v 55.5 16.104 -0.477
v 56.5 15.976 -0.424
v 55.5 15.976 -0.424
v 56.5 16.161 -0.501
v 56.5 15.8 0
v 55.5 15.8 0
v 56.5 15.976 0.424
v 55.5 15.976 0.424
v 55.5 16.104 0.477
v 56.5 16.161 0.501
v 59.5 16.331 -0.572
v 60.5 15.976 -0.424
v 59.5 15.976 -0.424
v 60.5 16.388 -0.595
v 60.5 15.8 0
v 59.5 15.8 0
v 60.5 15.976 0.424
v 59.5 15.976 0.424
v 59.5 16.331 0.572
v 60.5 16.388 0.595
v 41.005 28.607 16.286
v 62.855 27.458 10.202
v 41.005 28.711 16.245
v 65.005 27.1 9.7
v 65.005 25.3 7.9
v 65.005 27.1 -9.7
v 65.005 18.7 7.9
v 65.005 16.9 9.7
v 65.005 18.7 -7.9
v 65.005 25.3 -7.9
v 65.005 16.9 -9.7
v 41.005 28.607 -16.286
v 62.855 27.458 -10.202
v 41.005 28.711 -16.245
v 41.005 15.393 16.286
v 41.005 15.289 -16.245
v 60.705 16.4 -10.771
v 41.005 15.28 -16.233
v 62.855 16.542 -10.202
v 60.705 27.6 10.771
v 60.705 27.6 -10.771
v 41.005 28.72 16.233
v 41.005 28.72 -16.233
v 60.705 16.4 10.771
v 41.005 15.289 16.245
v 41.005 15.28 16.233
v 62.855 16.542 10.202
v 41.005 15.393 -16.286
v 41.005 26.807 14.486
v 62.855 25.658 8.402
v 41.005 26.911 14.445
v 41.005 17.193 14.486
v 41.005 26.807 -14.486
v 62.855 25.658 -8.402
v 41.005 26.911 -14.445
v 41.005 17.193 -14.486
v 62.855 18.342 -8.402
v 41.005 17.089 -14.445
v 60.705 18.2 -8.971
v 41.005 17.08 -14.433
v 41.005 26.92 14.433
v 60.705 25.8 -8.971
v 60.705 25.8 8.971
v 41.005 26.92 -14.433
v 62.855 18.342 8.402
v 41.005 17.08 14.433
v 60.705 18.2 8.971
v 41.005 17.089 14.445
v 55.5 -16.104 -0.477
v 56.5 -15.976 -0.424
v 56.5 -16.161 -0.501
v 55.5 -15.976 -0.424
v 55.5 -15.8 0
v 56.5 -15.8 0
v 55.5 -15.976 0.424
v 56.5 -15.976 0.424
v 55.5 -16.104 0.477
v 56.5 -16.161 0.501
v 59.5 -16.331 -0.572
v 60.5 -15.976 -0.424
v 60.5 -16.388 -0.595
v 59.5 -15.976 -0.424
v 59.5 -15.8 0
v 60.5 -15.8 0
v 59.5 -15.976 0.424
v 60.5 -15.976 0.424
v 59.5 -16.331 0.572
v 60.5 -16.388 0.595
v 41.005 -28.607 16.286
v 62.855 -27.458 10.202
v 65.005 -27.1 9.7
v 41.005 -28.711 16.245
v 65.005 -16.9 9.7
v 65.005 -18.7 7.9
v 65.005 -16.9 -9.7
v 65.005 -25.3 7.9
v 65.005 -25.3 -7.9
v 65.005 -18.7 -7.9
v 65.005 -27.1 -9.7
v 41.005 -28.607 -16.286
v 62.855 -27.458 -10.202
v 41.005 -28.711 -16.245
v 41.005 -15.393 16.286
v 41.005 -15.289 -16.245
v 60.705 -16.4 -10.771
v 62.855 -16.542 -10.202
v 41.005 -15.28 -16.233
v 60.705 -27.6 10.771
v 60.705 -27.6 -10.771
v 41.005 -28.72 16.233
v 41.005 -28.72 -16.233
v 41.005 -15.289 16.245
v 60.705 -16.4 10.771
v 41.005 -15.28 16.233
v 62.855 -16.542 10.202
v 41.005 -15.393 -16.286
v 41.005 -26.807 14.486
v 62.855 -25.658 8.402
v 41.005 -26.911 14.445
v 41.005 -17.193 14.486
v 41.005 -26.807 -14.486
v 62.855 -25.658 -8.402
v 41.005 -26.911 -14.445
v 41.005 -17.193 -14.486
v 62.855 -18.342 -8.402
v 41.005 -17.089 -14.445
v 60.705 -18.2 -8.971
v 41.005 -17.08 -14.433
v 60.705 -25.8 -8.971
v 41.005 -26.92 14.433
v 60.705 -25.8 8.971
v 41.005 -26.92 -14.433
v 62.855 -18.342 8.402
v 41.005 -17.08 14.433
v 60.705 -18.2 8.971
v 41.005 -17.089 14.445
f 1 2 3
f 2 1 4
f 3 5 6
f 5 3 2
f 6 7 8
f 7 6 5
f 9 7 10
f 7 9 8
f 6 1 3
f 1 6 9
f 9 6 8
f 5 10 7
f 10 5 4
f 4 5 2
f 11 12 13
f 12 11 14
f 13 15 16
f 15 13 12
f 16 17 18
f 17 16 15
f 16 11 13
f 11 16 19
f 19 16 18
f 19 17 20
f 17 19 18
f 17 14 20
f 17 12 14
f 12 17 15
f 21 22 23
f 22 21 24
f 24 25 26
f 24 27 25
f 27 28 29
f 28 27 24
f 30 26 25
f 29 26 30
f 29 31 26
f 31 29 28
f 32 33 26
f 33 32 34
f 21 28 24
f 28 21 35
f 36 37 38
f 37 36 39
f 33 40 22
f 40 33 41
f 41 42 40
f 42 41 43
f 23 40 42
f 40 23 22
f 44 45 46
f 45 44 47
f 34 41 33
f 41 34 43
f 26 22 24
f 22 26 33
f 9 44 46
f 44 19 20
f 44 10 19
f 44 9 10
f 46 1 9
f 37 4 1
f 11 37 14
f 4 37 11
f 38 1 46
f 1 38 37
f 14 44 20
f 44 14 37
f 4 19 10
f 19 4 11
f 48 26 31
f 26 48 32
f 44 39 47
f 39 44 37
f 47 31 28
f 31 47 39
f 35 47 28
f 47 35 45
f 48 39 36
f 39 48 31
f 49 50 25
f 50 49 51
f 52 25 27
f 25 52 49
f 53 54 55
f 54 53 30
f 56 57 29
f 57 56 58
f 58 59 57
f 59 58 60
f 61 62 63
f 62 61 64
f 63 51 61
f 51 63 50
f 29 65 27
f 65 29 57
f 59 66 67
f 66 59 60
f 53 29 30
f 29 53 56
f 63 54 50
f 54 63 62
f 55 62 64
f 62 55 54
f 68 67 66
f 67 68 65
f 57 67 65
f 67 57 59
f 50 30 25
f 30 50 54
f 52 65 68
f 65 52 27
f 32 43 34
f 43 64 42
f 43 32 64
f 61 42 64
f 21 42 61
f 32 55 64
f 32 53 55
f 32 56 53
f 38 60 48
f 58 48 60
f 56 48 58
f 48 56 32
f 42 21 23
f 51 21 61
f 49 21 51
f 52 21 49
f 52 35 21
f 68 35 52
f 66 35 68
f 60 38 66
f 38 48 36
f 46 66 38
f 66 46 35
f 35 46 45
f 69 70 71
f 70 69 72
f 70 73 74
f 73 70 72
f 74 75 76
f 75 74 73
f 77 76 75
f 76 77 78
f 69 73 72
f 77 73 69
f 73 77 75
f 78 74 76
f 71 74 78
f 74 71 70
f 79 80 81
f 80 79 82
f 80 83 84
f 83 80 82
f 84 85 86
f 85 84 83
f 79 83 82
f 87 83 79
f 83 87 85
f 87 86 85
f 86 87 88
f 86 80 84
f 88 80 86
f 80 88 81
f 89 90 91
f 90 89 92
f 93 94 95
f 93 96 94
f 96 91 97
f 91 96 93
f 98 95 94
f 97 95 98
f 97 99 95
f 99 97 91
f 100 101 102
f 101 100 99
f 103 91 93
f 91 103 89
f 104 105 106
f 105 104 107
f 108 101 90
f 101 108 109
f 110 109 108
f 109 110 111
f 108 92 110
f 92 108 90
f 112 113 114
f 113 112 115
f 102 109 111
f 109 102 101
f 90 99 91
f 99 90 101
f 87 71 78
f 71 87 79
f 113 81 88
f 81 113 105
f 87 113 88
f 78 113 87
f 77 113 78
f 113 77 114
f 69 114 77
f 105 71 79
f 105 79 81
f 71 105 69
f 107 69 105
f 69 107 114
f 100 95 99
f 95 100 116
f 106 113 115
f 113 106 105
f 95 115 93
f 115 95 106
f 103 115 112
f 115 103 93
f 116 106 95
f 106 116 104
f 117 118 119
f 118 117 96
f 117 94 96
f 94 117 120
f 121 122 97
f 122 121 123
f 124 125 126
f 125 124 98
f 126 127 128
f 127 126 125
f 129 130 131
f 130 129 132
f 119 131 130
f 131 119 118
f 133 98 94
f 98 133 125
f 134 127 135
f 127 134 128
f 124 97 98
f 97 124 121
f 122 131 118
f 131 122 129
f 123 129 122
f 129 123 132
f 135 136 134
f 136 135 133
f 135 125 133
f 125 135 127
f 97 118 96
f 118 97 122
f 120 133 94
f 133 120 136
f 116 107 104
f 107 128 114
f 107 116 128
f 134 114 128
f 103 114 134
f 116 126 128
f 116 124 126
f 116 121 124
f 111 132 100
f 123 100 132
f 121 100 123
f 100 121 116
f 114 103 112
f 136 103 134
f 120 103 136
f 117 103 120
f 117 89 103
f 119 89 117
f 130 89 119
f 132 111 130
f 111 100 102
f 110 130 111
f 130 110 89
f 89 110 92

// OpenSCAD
// ============================================================
//  OMX_F Gripper Finger Sleeve
//  Fits link6 (motorized) AND link7 (gear) — blade zone only
//  Blade X range: 22 mm → 65 mm  (finger-local frame)
//  Source dimensions: OMX_F gripper finger spec sheet
// ============================================================

// ── USER PARAMETERS ─────────────────────────────────────────

// Wall thickness around the blade (mm)
wall = 1.8;

// Extra clearance added to every cross-section (mm, tweak for print fit)
clearance = 0.3;

// Grip surface texture: "smooth", "ridged", "dotted"
grip_texture = "ridged";

// Ridged texture settings (ignored if grip_texture != "ridged")
ridge_pitch = 4.0;   // spacing between ridges (mm)
ridge_depth = 0.6;   // depth of each ridge (mm)

// Show the finger phantom (for visual check — disable before exporting)
show_phantom = false;

// Which finger to generate: "link6", "link7", or "both"
finger = "both";

// ── BLADE CROSS-SECTION DATA (from spec sheet) ───────────────
//   [ X,  half_Y, half_Z ]  — all mm, finger-local frame
blade_pts = [
    [ 22,  5.7, 19.4 ],
    [ 28,  4.2, 17.7 ],
    [ 36,  3.1, 15.5 ],
    [ 46,  2.8, 12.7 ],
    [ 55,  3.5, 10.3 ],
    [ 62,  3.5,  8.3 ],
    [ 65,  3.0,  7.6 ],
];

// ── DERIVED VALUES ────────────────────────────────────────────
sleeve_x_start = blade_pts[0][0];          // 22
sleeve_x_end   = blade_pts[len(blade_pts)-1][0];  // 65
sleeve_length  = sleeve_x_end - sleeve_x_start;   // 43

// ── HELPERS ───────────────────────────────────────────────────

// Linearly interpolate blade cross-section at a given X position
function blade_half_y(x) =
    let(i = search_segment(x))
    let(x0 = blade_pts[i][0],   y0 = blade_pts[i][1],
        x1 = blade_pts[i+1][0], y1 = blade_pts[i+1][1])
    y0 + (y1-y0) * (x-x0)/(x1-x0);

function blade_half_z(x) =
    let(i = search_segment(x))
    let(x0 = blade_pts[i][0],   z0 = blade_pts[i][2],
        x1 = blade_pts[i+1][0], z1 = blade_pts[i+1][2])
    z0 + (z1-z0) * (x-x0)/(x1-x0);

// Return the blade_pts index i such that blade_pts[i][0] <= x < blade_pts[i+1][0]
function search_segment(x, i=0) =
    (i >= len(blade_pts)-2) ? i :
    (x <= blade_pts[i+1][0]) ? i : search_segment(x, i+1);

// ── SLEEVE BODY ───────────────────────────────────────────────
// Built as a hull of scaled rectangles along X, then subtract the
// inner cavity (blade shape + clearance).

N_SLICES = 20;   // number of cross-section slices

module blade_slice(x, extra_y=0, extra_z=0) {
    hy = blade_half_y(x) + extra_y;
    hz = blade_half_z(x) + extra_z;
    translate([x, 0, 0])
        cube([0.01, hy*2, hz*2], center=true);
}

module sleeve_outer() {
    hull()
        for (i = [0:N_SLICES]) {
            x = sleeve_x_start + i * sleeve_length / N_SLICES;
            blade_slice(x, extra_y = wall + clearance,
                           extra_z = wall + clearance);
        }
}

module sleeve_inner_cavity() {
    // finger blade + clearance gap
    hull()
        for (i = [0:N_SLICES]) {
            x = sleeve_x_start + i * sleeve_length / N_SLICES;
            blade_slice(x, extra_y = clearance,
                           extra_z = clearance);
        }
}

// Entry chamfer — open the back end so the blade slides in easily
module entry_chamfer() {
    chamfer = 3.0;
    hull() {
        blade_slice(sleeve_x_start,
            extra_y = clearance + wall,
            extra_z = clearance + wall);
        blade_slice(sleeve_x_start,
            extra_y = clearance + wall + chamfer,
            extra_z = clearance + wall + chamfer);
        translate([sleeve_x_start - chamfer, 0, 0])
            blade_slice(sleeve_x_start,
                extra_y = clearance + wall + chamfer,
                extra_z = clearance + wall + chamfer);
    }
}

// Ridged grip texture on the outer −Y face (inner/gripping side)
module add_ridges() {
    n_ridges = floor(sleeve_length / ridge_pitch);
    for (i = [0:n_ridges-1]) {
        x = sleeve_x_start + (i + 0.5) * ridge_pitch;
        if (x < sleeve_x_end) {
            hy_out = blade_half_y(x) + wall + clearance;
            hz_out = blade_half_z(x) + wall + clearance;
            // Ridge sits on the −Y (inner/gripping) face
            translate([x, -hy_out, 0])
                rotate([0, 90, 0])
                    cylinder(d=ridge_depth*2, h=1.0, center=true, $fn=8);
        }
    }
}

// Full sleeve for one finger
module sleeve(mirror_y=false) {
    scale([1, mirror_y ? -1 : 1, 1])
    difference() {
        union() {
            sleeve_outer();
            if (grip_texture == "ridged") add_ridges();
        }
        sleeve_inner_cavity();
        entry_chamfer();
    }
}

// ── PHANTOM FINGER (visual check only) ───────────────────────
module finger_phantom() {
    color("cyan", 0.25)
    hull()
        for (i = [0:N_SLICES]) {
            x = sleeve_x_start + i * sleeve_length / N_SLICES;
            blade_slice(x);
        }
}

// ── RENDER ───────────────────────────────────────────────────
// link6: inner face = −Y  (no Y mirror needed)
// link7: inner face = +Y  (mirror in Y)

Y_OFFSET = 22;   // visual separation when showing both

if (finger == "link6") {
    sleeve(mirror_y=false);
    if (show_phantom) finger_phantom();

} else if (finger == "link7") {
    sleeve(mirror_y=true);
    if (show_phantom) finger_phantom();

} else { // "both" — side by side
    translate([0,  Y_OFFSET, 0]) {
        sleeve(mirror_y=false);
        if (show_phantom) finger_phantom();
    }
    translate([0, -Y_OFFSET, 0]) {
        sleeve(mirror_y=true);
        if (show_phantom) finger_phantom();
    }
}

// ============================================================
// USAGE NOTES
// ─────────────────────────────────────────────────────────────
// 1. Open in OpenSCAD ≥ 2021.01
// 2. Set `show_phantom = false` before exporting STL
// 3. Render (F6) → Export as STL (F7)
// 4. Print orientation: lay flat (X axis = print bed length)
// 5. Recommended: PETG or TPU for grip; 3–4 walls, 20 % infill
// 6. If sleeve is loose, increase `wall`; if too tight, increase `clearance`
// 7. Inner/outer face convention:
//      link6 "inner" (gripping) = local −Y  → sleeve open on −Y side
//      link7 "inner" (gripping) = local +Y  → mirrored
// ============================================================
